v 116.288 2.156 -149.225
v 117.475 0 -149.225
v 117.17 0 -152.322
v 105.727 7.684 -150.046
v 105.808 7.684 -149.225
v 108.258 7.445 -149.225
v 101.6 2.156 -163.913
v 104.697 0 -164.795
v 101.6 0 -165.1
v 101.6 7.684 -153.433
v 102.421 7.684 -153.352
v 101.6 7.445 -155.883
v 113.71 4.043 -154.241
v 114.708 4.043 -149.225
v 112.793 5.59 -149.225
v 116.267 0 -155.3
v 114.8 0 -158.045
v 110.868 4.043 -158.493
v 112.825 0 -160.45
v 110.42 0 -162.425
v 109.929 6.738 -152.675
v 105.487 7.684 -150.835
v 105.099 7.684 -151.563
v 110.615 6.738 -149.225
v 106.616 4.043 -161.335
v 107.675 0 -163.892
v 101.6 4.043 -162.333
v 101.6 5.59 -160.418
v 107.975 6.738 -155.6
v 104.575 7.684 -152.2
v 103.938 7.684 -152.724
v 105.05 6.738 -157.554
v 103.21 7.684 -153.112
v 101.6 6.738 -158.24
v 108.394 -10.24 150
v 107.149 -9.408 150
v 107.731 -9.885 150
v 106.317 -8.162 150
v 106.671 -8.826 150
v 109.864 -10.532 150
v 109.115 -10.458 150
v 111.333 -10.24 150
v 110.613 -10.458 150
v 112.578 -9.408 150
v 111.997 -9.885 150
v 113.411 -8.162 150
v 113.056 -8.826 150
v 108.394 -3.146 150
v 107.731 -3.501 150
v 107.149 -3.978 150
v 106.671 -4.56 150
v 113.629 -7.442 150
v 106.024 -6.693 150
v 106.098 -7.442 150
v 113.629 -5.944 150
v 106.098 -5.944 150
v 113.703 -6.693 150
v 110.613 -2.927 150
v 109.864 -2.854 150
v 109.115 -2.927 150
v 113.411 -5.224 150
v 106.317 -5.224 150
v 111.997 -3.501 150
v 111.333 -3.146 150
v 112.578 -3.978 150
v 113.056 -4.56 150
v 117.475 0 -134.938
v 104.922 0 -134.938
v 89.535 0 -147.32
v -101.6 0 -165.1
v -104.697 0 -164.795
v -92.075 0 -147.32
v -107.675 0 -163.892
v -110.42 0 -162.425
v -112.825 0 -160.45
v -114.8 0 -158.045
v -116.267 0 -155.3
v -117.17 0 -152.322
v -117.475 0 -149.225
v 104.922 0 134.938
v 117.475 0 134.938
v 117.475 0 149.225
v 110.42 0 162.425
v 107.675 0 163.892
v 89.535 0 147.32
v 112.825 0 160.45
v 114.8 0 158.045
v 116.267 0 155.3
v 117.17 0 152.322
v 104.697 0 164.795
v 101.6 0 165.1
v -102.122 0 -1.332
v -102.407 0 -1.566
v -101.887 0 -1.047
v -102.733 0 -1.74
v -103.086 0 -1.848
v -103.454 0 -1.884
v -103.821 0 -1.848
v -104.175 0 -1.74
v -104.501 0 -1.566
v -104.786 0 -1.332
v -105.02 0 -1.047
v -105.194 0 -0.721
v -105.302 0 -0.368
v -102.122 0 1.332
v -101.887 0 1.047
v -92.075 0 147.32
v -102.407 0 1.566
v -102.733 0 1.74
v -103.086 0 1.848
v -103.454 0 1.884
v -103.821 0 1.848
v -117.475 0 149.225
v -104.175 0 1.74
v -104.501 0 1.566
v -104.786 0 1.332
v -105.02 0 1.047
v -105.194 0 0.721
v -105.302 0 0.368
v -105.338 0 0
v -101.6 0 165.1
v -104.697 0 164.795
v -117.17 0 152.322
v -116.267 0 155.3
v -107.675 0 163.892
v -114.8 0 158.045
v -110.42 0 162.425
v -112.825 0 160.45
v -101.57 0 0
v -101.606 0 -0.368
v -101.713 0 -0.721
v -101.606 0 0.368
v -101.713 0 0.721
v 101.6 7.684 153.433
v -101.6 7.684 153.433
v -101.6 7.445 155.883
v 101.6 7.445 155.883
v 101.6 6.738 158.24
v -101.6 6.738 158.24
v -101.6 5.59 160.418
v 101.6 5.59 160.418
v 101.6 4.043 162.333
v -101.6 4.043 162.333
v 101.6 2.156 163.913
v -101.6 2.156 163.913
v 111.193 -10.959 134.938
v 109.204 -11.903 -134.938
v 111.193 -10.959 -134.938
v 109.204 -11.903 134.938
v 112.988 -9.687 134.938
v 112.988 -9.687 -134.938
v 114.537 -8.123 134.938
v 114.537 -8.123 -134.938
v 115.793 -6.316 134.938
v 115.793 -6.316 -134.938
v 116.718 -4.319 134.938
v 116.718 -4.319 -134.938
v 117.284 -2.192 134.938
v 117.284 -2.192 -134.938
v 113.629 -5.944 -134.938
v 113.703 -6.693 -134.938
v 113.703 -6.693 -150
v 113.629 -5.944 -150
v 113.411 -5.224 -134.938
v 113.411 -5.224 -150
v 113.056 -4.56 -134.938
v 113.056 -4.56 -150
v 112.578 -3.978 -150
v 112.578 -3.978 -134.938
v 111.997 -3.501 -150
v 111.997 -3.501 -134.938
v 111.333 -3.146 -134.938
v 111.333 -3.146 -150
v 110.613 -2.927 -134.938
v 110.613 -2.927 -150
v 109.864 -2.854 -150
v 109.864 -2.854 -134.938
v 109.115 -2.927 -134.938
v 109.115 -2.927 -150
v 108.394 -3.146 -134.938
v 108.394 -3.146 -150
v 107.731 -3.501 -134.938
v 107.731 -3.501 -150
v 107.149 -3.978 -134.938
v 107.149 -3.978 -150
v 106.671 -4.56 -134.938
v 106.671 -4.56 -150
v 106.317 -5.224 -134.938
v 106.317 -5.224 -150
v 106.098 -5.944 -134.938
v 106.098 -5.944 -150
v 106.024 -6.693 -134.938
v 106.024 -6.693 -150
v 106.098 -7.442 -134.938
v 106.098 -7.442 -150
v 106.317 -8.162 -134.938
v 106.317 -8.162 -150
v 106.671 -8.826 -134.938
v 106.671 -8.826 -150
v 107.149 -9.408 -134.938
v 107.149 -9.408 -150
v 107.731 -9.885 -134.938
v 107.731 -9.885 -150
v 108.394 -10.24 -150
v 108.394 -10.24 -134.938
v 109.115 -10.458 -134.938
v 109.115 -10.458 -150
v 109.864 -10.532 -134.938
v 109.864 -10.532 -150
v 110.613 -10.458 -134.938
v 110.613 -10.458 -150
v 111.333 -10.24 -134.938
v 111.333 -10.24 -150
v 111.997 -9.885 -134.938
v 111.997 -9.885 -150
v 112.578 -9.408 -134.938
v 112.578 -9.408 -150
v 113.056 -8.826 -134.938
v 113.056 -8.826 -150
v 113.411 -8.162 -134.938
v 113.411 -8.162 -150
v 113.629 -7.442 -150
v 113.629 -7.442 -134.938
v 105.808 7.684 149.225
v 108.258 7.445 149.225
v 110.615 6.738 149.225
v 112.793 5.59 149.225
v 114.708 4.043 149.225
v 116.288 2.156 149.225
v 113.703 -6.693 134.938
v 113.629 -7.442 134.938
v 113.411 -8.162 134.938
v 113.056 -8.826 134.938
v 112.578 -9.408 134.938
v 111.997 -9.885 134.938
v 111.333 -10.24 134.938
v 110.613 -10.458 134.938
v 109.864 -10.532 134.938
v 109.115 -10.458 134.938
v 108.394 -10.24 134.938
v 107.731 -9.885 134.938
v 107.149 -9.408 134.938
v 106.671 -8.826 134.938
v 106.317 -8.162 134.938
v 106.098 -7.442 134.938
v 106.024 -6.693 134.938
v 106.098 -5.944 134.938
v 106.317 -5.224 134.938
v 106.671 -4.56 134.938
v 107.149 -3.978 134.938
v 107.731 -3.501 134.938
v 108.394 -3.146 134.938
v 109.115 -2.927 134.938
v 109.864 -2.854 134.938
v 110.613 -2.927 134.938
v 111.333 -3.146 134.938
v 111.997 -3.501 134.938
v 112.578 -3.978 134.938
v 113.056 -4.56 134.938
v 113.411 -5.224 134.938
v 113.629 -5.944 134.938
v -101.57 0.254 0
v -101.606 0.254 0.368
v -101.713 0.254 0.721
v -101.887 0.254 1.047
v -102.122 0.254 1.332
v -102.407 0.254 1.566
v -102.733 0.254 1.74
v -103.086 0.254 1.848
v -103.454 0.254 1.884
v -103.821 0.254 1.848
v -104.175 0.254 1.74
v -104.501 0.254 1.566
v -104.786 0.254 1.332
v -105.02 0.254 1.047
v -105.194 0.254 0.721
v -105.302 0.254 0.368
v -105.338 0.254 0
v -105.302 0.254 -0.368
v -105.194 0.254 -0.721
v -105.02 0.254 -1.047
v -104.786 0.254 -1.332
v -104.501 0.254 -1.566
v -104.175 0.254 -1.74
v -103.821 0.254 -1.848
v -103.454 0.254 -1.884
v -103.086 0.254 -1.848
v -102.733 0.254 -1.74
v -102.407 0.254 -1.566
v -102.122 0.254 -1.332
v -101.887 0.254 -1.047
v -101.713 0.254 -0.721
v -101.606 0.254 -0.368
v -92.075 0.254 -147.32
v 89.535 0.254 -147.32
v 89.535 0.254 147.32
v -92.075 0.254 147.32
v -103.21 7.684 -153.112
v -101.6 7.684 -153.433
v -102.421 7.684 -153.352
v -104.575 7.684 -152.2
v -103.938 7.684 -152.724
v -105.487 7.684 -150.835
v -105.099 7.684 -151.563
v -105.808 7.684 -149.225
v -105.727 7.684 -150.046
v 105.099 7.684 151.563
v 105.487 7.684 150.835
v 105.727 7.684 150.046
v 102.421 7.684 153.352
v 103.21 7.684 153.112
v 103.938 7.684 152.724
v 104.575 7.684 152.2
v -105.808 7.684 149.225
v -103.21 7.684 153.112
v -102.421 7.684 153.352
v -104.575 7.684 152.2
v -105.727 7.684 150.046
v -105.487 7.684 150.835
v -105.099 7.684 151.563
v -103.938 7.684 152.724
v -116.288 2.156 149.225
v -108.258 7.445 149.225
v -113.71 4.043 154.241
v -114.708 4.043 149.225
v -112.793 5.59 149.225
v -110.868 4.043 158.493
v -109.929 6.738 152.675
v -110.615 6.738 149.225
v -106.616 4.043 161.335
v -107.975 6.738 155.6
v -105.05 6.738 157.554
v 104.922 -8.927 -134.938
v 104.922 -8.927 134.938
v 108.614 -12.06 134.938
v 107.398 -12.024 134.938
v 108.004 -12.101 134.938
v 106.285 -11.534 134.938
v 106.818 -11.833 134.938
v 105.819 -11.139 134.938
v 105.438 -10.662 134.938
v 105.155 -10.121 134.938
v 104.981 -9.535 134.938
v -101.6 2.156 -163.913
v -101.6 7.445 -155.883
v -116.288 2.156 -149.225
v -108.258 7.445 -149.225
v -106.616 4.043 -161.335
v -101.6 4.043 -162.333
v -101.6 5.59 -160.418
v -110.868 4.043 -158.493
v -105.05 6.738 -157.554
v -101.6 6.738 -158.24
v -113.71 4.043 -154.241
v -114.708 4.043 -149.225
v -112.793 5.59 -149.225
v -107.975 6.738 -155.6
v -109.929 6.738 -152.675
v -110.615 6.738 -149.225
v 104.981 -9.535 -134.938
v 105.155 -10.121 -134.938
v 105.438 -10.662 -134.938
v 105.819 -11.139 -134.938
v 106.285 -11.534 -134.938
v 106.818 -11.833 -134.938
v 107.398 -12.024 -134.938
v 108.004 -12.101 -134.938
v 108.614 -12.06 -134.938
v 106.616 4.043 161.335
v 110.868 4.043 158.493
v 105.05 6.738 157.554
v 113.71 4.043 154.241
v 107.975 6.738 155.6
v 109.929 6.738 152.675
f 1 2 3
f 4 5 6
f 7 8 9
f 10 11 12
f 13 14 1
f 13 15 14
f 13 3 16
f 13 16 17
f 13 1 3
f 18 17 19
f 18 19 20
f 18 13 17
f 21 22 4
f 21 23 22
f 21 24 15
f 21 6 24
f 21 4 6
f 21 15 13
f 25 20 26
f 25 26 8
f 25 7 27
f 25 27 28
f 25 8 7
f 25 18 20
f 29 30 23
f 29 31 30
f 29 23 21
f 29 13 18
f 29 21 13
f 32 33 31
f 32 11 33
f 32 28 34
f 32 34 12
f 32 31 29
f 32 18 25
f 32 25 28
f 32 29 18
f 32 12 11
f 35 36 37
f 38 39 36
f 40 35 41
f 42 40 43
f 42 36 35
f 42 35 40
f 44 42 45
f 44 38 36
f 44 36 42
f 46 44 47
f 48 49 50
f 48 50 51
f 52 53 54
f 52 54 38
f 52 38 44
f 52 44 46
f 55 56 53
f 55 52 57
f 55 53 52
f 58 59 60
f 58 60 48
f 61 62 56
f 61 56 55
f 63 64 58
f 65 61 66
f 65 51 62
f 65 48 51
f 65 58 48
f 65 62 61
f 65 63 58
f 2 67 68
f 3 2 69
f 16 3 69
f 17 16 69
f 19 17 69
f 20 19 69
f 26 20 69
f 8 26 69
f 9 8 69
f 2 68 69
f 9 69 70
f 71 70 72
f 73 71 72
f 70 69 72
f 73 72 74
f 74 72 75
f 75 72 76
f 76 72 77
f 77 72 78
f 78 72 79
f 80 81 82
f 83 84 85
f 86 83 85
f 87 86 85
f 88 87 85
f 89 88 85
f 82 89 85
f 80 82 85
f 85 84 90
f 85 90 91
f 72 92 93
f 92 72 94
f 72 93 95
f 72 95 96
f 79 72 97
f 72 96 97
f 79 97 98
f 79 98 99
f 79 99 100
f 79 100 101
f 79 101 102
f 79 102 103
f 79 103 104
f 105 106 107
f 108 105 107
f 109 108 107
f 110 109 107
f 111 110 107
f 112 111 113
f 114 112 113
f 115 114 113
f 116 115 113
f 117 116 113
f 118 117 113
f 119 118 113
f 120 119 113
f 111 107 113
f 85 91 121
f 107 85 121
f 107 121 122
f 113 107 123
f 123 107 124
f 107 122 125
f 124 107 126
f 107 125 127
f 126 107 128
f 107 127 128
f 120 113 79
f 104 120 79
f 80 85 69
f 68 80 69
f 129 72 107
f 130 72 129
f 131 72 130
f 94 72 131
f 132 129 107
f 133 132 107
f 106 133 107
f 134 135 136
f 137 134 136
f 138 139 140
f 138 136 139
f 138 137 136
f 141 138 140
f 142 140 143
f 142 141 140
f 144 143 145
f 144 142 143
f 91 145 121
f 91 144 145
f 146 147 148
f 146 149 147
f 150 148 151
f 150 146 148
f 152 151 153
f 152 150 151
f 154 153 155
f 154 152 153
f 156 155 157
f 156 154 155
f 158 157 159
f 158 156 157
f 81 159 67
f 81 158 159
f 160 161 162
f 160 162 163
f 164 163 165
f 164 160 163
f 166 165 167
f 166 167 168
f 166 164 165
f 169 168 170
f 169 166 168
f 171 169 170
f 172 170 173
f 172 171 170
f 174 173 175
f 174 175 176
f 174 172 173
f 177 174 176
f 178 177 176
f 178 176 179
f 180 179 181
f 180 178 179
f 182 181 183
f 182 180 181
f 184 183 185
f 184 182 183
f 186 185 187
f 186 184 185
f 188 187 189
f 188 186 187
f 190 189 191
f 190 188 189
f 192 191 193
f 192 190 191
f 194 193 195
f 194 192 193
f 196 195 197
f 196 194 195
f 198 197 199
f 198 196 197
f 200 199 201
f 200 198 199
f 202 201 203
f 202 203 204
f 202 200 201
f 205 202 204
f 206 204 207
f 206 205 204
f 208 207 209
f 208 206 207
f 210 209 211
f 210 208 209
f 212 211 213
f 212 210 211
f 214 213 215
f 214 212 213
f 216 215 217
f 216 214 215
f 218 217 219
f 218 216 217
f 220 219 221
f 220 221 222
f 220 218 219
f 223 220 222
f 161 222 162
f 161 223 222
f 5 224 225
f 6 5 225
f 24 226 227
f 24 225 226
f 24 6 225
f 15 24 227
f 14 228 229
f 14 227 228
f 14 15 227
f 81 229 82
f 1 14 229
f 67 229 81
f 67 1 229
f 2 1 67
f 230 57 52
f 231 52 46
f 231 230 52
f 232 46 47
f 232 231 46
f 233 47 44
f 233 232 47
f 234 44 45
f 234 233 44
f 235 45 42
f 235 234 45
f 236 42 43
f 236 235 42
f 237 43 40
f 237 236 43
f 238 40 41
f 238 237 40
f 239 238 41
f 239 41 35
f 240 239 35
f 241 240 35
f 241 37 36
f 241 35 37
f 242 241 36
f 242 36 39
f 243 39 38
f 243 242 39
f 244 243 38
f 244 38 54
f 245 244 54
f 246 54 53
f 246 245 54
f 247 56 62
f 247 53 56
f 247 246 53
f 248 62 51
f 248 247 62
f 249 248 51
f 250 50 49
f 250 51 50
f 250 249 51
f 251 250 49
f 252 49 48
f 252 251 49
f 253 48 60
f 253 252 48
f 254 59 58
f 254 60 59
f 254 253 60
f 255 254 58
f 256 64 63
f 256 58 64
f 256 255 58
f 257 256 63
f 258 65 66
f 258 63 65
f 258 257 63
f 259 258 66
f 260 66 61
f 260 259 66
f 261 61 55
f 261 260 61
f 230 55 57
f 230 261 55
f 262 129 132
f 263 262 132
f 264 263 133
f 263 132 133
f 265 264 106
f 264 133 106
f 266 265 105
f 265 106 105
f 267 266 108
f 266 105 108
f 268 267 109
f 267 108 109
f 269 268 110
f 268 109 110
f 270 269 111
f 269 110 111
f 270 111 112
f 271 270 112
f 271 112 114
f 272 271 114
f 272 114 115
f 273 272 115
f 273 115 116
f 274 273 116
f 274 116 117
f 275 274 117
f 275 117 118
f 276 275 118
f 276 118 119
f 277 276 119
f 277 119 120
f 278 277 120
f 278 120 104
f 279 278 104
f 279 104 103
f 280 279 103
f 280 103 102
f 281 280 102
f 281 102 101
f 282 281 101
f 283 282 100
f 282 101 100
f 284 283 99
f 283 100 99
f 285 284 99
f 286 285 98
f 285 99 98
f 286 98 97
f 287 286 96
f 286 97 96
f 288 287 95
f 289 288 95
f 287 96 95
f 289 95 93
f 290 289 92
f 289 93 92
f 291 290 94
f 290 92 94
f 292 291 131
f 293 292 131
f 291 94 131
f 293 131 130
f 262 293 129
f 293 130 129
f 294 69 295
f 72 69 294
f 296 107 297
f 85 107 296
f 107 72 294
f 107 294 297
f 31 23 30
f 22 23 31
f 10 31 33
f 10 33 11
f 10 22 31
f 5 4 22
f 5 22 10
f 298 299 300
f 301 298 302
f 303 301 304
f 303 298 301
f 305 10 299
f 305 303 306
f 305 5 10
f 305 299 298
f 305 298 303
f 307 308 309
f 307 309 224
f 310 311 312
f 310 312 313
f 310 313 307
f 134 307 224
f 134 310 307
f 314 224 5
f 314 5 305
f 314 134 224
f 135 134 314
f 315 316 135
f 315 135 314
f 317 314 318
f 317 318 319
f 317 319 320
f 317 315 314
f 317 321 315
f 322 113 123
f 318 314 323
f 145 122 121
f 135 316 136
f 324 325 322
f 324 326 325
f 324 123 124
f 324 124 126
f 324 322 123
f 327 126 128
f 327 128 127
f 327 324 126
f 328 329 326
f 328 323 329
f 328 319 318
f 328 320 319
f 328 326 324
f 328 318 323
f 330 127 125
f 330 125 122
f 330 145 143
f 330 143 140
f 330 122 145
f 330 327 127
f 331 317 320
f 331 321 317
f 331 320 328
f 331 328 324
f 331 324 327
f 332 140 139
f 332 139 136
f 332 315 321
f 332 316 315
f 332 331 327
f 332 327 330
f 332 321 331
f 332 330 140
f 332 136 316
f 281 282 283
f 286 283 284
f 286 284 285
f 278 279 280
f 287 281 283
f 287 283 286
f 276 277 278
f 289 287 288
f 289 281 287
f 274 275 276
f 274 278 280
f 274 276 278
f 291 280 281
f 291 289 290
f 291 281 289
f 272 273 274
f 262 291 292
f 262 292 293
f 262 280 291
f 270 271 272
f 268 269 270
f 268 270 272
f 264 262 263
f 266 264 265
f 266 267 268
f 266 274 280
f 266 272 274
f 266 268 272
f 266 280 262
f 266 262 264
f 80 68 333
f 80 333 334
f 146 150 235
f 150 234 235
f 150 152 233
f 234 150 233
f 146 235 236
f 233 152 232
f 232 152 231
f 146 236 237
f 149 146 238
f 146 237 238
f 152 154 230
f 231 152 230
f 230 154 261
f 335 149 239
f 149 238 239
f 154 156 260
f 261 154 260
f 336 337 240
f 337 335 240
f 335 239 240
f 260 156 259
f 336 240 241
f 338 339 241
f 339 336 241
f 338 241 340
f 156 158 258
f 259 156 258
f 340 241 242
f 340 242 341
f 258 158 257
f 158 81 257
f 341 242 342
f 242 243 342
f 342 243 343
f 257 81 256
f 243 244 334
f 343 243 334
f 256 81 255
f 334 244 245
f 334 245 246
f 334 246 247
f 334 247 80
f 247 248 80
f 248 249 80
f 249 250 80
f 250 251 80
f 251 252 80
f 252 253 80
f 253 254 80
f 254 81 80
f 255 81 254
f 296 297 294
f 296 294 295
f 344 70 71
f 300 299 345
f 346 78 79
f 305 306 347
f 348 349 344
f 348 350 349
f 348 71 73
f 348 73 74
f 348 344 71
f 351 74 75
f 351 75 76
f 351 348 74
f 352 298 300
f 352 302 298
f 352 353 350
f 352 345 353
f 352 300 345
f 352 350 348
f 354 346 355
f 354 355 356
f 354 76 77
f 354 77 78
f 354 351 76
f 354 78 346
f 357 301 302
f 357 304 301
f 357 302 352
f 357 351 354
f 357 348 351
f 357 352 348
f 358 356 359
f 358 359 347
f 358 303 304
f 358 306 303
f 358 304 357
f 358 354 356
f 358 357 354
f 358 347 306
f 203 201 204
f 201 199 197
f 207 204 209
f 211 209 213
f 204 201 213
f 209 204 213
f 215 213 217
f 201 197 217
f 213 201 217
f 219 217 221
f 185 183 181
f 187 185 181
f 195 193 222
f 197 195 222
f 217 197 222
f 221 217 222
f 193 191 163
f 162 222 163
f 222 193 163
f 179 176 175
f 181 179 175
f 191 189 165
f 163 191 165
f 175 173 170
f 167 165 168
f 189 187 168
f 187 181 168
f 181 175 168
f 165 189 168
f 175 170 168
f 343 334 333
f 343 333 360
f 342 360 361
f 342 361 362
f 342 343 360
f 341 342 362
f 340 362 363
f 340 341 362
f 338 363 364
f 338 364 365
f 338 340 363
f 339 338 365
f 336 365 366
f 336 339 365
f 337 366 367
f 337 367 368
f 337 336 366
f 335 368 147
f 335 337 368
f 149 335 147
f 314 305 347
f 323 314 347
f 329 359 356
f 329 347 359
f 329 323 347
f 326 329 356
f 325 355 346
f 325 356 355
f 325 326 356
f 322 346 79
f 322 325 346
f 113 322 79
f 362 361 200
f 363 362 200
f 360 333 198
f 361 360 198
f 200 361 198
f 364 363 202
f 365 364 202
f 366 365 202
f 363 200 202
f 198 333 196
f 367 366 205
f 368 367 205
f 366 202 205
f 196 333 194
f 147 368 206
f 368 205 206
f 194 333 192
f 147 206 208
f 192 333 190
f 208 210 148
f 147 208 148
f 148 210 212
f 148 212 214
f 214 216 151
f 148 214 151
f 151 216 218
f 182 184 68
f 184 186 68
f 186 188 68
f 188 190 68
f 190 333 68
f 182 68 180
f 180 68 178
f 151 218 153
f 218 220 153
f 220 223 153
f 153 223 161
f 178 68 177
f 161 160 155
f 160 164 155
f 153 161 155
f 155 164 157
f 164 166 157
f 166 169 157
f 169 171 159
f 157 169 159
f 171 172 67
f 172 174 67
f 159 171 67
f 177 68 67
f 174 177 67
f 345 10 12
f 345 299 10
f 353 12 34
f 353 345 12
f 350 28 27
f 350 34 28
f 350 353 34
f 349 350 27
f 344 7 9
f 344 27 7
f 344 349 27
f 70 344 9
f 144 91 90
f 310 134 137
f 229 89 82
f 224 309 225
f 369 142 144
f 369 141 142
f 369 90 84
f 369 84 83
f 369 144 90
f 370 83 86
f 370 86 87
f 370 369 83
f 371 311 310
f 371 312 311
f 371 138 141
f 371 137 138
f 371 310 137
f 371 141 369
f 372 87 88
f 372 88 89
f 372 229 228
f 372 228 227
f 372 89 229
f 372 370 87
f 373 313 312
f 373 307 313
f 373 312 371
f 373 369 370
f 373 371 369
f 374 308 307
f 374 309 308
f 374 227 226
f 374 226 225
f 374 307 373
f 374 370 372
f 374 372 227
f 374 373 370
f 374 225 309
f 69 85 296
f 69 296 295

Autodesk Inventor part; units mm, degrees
ref_plane "YZ Plane" through (0, 0, 0) normal (1, 0, 0) x (0, 1, 0)
ref_plane "XZ Plane" through (0, 0, 0) normal (0, 1, 0) x (-1, 0, 0)
ref_plane "XY Plane" through (0, 0, 0) normal (0, 0, 1) x (1, 0, 0)
sketch "Sketch1" plane through (0, 0, 0) normal (0, 1, 0) x (-1, 0, 0)
  line L0 (-101.6, 165.1) -> (101.6, 165.1)
  line L1 (117.475, 149.225) -> (117.475, -149.225)
  line L2 (101.6, -165.1) -> (-101.6, -165.1)
  line L3 (-117.475, -149.225) -> (-117.475, 149.225)
  line L4 (-117.475, 165.1) -> (117.475, -165.1) construction
  line L5 (117.475, 165.1) -> (-117.475, -165.1) construction
  arc A0 (-101.6, 165.1) -> (-117.475, 149.225) centre (-101.6, 149.225) ccw
  arc A1 (-117.475, -149.225) -> (-101.6, -165.1) centre (-101.6, -149.225) ccw
  arc A2 (101.6, -165.1) -> (117.475, -149.225) centre (101.6, -149.225) ccw
  arc A3 (117.475, 149.225) -> (101.6, 165.1) centre (101.6, 149.225) ccw
  point P0 (0, 0)
  point P1 (0, 0)
  dimension "d0" = 330.2
  dimension "d1" = 234.95
  dimension "d2" = 15.875
extrude "Extrusion1" add sketch "Sketch1" along normal blind 7.6835
fillet "Fillet1" radius 12.7 8 edges at (117.475, 7.6835, 0) (112.8253, 7.6835, -160.4503) (0, 7.6835, -165.1) (-112.8253, 7.6835, -160.4503) (-117.475, 7.6835, 0) (-112.8253, 7.6835, 160.4503) (0, 7.6835, 165.1) (112.8253, 7.6835, 160.4503)
sketch "Sketch2" plane through (0, 0, 0) normal (0, -1, 0) x (1, 0, 0)
  line L0 (101.6103, 150.8125) -> (101.6103, -150.8125) projected
  arc A0 (101.6103, 150.8125) -> (101.6, 150.8228) centre (101.6, 150.8125) ccw projected
  line L1 (-101.6, 150.8228) -> (101.6, 150.8228) projected
  arc A1 (-101.6, 150.8228) -> (-101.6103, 150.8125) centre (-101.6, 150.8125) ccw projected
  line L2 (-101.6103, -150.8125) -> (-101.6103, 150.8125) projected
  arc A2 (-101.6103, -150.8125) -> (-101.6, -150.8228) centre (-101.6, -150.8125) ccw projected
  line L3 (101.6, -150.8228) -> (-101.6, -150.8228) projected
  arc A3 (101.6, -150.8228) -> (101.6103, -150.8125) centre (101.6, -150.8125) ccw projected
  line L4 (103.505, -134.9375) -> (117.475, -134.9375) projected
  line L5 (117.475, -134.9375) -> (117.475, -150.8125) projected
  arc A4 (101.6, -166.6875) -> (117.475, -150.8125) centre (101.6, -150.8125) ccw projected
  line L6 (101.6, -166.6875) -> (-101.6, -166.6875) projected
  arc A5 (-117.475, -150.8125) -> (-101.6, -166.6875) centre (-101.6, -150.8125) ccw projected
  line L7 (-117.475, -150.8125) -> (-117.475, 150.8125) projected
  arc A6 (-101.6, 166.6875) -> (-117.475, 150.8125) centre (-101.6, 150.8125) ccw projected
  line L8 (-101.6, 166.6875) -> (101.6, 166.6875) projected
  arc A7 (117.475, 150.8125) -> (101.6, 166.6875) centre (101.6, 150.8125) ccw projected
  line L9 (117.475, 150.8125) -> (117.475, 134.9375) projected
  line L10 (117.475, 134.9375) -> (103.505, 134.9375) projected
  line L11 (103.505, 134.9375) -> (103.505, -134.9375) projected
  circle A8 centre (76.6206, 156.377) radius 5.1319 projected
  line L12 (-38.4175, -52.3875) -> (-38.4175, 52.3875) projected
  line L13 (-38.4175, 52.3875) -> (-104.4575, 52.3875) projected
  line L14 (-104.4575, 52.3875) -> (-104.4575, -52.3875) projected
  line L15 (-104.4575, -52.3875) -> (-38.4175, -52.3875) projected
  line L16 (88.265, -146.05) -> (88.265, 146.05) projected
  line L17 (88.265, 146.05) -> (-28.8925, 146.05) projected
  line L18 (-28.8925, 146.05) -> (-28.8925, -146.05) projected
  line L19 (-28.8925, -146.05) -> (88.265, -146.05) projected
  line L20 (104.922, 134.9375) -> (117.475, 134.9375)
  line L21 (117.475, 134.9375) -> (117.475, -134.9375)
  line L22 (117.475, -134.9375) -> (104.922, -134.9375)
  line L23 (104.922, -134.9375) -> (104.922, 134.9375)
  point P0 (0, 0)
extrude "Extrusion2" add sketch "Sketch2" along normal blind 12.7 contours L23 L10 L21 L4
sketch "Sketch4" plane through (0, 0, 0) normal (0, 0, 1) x (1, 0, 0)
  circle A0 centre (109.8636, -6.6929) radius 3.8393 projected
  circle A1 centre (109.8636, -6.6929) radius 3.8393 projected
  point P0 (0, 0)
extrude "Extrusion3" add sketch "Sketch4" along normal mid plane 300
fillet "Fillet2" radius 12.7 1 edges at (117.475, -12.7, 0)
fillet "Fillet3" radius 3.175 1 edges at (104.922, -12.6991, 0)
sketch "Sketch5" plane through (0, 0, 0) normal (0, -1, 0) x (1, 0, 0)
  line L0 (104.922, 134.9375) -> (117.475, 134.9375) projected
  line L1 (117.475, 149.225) -> (117.475, 134.9375) projected
  arc A0 (117.475, 149.225) -> (101.6, 165.1) centre (101.6, 149.225) ccw projected
  line L2 (-101.6, 165.1) -> (101.6, 165.1) projected
  arc A1 (-101.6, 165.1) -> (-117.475, 149.225) centre (-101.6, 149.225) ccw projected
  line L3 (-117.475, -149.225) -> (-117.475, 149.225) projected
  arc A2 (-117.475, -149.225) -> (-101.6, -165.1) centre (-101.6, -149.225) ccw projected
  line L4 (101.6, -165.1) -> (-101.6, -165.1) projected
  arc A3 (101.6, -165.1) -> (117.475, -149.225) centre (101.6, -149.225) ccw projected
  line L5 (117.475, -134.9375) -> (117.475, -149.225) projected
  line L6 (117.475, -134.9375) -> (104.922, -134.9375) projected
  line L7 (104.922, -134.9375) -> (104.922, 134.9375) projected
  line L8 (89.535, -147.32) -> (-92.075, -147.32)
  line L9 (-92.075, -147.32) -> (-92.075, 147.32)
  line L10 (-92.075, 147.32) -> (89.535, 147.32)
  line L11 (89.535, 147.32) -> (89.535, -147.32)
  line L12 (89.535, -147.32) -> (-92.075, 147.32) construction
  line L13 (-92.075, -147.32) -> (89.535, 147.32) construction
  circle A4 centre (-103.4539, 0) radius 1.8839
  point P0 (0, 0)
  point P1 (-1.27, 0)
  dimension "d12" = 17.78
  dimension "d13" = 17.78
  dimension "d14" = 25.4
  dimension "d15" = 27.94
extrude "Extrusion4" cut sketch "Sketch5" against normal blind 0.254 contours L8 L9 L10 L11 | A4
properties part number "dellLatitudeScreen"
